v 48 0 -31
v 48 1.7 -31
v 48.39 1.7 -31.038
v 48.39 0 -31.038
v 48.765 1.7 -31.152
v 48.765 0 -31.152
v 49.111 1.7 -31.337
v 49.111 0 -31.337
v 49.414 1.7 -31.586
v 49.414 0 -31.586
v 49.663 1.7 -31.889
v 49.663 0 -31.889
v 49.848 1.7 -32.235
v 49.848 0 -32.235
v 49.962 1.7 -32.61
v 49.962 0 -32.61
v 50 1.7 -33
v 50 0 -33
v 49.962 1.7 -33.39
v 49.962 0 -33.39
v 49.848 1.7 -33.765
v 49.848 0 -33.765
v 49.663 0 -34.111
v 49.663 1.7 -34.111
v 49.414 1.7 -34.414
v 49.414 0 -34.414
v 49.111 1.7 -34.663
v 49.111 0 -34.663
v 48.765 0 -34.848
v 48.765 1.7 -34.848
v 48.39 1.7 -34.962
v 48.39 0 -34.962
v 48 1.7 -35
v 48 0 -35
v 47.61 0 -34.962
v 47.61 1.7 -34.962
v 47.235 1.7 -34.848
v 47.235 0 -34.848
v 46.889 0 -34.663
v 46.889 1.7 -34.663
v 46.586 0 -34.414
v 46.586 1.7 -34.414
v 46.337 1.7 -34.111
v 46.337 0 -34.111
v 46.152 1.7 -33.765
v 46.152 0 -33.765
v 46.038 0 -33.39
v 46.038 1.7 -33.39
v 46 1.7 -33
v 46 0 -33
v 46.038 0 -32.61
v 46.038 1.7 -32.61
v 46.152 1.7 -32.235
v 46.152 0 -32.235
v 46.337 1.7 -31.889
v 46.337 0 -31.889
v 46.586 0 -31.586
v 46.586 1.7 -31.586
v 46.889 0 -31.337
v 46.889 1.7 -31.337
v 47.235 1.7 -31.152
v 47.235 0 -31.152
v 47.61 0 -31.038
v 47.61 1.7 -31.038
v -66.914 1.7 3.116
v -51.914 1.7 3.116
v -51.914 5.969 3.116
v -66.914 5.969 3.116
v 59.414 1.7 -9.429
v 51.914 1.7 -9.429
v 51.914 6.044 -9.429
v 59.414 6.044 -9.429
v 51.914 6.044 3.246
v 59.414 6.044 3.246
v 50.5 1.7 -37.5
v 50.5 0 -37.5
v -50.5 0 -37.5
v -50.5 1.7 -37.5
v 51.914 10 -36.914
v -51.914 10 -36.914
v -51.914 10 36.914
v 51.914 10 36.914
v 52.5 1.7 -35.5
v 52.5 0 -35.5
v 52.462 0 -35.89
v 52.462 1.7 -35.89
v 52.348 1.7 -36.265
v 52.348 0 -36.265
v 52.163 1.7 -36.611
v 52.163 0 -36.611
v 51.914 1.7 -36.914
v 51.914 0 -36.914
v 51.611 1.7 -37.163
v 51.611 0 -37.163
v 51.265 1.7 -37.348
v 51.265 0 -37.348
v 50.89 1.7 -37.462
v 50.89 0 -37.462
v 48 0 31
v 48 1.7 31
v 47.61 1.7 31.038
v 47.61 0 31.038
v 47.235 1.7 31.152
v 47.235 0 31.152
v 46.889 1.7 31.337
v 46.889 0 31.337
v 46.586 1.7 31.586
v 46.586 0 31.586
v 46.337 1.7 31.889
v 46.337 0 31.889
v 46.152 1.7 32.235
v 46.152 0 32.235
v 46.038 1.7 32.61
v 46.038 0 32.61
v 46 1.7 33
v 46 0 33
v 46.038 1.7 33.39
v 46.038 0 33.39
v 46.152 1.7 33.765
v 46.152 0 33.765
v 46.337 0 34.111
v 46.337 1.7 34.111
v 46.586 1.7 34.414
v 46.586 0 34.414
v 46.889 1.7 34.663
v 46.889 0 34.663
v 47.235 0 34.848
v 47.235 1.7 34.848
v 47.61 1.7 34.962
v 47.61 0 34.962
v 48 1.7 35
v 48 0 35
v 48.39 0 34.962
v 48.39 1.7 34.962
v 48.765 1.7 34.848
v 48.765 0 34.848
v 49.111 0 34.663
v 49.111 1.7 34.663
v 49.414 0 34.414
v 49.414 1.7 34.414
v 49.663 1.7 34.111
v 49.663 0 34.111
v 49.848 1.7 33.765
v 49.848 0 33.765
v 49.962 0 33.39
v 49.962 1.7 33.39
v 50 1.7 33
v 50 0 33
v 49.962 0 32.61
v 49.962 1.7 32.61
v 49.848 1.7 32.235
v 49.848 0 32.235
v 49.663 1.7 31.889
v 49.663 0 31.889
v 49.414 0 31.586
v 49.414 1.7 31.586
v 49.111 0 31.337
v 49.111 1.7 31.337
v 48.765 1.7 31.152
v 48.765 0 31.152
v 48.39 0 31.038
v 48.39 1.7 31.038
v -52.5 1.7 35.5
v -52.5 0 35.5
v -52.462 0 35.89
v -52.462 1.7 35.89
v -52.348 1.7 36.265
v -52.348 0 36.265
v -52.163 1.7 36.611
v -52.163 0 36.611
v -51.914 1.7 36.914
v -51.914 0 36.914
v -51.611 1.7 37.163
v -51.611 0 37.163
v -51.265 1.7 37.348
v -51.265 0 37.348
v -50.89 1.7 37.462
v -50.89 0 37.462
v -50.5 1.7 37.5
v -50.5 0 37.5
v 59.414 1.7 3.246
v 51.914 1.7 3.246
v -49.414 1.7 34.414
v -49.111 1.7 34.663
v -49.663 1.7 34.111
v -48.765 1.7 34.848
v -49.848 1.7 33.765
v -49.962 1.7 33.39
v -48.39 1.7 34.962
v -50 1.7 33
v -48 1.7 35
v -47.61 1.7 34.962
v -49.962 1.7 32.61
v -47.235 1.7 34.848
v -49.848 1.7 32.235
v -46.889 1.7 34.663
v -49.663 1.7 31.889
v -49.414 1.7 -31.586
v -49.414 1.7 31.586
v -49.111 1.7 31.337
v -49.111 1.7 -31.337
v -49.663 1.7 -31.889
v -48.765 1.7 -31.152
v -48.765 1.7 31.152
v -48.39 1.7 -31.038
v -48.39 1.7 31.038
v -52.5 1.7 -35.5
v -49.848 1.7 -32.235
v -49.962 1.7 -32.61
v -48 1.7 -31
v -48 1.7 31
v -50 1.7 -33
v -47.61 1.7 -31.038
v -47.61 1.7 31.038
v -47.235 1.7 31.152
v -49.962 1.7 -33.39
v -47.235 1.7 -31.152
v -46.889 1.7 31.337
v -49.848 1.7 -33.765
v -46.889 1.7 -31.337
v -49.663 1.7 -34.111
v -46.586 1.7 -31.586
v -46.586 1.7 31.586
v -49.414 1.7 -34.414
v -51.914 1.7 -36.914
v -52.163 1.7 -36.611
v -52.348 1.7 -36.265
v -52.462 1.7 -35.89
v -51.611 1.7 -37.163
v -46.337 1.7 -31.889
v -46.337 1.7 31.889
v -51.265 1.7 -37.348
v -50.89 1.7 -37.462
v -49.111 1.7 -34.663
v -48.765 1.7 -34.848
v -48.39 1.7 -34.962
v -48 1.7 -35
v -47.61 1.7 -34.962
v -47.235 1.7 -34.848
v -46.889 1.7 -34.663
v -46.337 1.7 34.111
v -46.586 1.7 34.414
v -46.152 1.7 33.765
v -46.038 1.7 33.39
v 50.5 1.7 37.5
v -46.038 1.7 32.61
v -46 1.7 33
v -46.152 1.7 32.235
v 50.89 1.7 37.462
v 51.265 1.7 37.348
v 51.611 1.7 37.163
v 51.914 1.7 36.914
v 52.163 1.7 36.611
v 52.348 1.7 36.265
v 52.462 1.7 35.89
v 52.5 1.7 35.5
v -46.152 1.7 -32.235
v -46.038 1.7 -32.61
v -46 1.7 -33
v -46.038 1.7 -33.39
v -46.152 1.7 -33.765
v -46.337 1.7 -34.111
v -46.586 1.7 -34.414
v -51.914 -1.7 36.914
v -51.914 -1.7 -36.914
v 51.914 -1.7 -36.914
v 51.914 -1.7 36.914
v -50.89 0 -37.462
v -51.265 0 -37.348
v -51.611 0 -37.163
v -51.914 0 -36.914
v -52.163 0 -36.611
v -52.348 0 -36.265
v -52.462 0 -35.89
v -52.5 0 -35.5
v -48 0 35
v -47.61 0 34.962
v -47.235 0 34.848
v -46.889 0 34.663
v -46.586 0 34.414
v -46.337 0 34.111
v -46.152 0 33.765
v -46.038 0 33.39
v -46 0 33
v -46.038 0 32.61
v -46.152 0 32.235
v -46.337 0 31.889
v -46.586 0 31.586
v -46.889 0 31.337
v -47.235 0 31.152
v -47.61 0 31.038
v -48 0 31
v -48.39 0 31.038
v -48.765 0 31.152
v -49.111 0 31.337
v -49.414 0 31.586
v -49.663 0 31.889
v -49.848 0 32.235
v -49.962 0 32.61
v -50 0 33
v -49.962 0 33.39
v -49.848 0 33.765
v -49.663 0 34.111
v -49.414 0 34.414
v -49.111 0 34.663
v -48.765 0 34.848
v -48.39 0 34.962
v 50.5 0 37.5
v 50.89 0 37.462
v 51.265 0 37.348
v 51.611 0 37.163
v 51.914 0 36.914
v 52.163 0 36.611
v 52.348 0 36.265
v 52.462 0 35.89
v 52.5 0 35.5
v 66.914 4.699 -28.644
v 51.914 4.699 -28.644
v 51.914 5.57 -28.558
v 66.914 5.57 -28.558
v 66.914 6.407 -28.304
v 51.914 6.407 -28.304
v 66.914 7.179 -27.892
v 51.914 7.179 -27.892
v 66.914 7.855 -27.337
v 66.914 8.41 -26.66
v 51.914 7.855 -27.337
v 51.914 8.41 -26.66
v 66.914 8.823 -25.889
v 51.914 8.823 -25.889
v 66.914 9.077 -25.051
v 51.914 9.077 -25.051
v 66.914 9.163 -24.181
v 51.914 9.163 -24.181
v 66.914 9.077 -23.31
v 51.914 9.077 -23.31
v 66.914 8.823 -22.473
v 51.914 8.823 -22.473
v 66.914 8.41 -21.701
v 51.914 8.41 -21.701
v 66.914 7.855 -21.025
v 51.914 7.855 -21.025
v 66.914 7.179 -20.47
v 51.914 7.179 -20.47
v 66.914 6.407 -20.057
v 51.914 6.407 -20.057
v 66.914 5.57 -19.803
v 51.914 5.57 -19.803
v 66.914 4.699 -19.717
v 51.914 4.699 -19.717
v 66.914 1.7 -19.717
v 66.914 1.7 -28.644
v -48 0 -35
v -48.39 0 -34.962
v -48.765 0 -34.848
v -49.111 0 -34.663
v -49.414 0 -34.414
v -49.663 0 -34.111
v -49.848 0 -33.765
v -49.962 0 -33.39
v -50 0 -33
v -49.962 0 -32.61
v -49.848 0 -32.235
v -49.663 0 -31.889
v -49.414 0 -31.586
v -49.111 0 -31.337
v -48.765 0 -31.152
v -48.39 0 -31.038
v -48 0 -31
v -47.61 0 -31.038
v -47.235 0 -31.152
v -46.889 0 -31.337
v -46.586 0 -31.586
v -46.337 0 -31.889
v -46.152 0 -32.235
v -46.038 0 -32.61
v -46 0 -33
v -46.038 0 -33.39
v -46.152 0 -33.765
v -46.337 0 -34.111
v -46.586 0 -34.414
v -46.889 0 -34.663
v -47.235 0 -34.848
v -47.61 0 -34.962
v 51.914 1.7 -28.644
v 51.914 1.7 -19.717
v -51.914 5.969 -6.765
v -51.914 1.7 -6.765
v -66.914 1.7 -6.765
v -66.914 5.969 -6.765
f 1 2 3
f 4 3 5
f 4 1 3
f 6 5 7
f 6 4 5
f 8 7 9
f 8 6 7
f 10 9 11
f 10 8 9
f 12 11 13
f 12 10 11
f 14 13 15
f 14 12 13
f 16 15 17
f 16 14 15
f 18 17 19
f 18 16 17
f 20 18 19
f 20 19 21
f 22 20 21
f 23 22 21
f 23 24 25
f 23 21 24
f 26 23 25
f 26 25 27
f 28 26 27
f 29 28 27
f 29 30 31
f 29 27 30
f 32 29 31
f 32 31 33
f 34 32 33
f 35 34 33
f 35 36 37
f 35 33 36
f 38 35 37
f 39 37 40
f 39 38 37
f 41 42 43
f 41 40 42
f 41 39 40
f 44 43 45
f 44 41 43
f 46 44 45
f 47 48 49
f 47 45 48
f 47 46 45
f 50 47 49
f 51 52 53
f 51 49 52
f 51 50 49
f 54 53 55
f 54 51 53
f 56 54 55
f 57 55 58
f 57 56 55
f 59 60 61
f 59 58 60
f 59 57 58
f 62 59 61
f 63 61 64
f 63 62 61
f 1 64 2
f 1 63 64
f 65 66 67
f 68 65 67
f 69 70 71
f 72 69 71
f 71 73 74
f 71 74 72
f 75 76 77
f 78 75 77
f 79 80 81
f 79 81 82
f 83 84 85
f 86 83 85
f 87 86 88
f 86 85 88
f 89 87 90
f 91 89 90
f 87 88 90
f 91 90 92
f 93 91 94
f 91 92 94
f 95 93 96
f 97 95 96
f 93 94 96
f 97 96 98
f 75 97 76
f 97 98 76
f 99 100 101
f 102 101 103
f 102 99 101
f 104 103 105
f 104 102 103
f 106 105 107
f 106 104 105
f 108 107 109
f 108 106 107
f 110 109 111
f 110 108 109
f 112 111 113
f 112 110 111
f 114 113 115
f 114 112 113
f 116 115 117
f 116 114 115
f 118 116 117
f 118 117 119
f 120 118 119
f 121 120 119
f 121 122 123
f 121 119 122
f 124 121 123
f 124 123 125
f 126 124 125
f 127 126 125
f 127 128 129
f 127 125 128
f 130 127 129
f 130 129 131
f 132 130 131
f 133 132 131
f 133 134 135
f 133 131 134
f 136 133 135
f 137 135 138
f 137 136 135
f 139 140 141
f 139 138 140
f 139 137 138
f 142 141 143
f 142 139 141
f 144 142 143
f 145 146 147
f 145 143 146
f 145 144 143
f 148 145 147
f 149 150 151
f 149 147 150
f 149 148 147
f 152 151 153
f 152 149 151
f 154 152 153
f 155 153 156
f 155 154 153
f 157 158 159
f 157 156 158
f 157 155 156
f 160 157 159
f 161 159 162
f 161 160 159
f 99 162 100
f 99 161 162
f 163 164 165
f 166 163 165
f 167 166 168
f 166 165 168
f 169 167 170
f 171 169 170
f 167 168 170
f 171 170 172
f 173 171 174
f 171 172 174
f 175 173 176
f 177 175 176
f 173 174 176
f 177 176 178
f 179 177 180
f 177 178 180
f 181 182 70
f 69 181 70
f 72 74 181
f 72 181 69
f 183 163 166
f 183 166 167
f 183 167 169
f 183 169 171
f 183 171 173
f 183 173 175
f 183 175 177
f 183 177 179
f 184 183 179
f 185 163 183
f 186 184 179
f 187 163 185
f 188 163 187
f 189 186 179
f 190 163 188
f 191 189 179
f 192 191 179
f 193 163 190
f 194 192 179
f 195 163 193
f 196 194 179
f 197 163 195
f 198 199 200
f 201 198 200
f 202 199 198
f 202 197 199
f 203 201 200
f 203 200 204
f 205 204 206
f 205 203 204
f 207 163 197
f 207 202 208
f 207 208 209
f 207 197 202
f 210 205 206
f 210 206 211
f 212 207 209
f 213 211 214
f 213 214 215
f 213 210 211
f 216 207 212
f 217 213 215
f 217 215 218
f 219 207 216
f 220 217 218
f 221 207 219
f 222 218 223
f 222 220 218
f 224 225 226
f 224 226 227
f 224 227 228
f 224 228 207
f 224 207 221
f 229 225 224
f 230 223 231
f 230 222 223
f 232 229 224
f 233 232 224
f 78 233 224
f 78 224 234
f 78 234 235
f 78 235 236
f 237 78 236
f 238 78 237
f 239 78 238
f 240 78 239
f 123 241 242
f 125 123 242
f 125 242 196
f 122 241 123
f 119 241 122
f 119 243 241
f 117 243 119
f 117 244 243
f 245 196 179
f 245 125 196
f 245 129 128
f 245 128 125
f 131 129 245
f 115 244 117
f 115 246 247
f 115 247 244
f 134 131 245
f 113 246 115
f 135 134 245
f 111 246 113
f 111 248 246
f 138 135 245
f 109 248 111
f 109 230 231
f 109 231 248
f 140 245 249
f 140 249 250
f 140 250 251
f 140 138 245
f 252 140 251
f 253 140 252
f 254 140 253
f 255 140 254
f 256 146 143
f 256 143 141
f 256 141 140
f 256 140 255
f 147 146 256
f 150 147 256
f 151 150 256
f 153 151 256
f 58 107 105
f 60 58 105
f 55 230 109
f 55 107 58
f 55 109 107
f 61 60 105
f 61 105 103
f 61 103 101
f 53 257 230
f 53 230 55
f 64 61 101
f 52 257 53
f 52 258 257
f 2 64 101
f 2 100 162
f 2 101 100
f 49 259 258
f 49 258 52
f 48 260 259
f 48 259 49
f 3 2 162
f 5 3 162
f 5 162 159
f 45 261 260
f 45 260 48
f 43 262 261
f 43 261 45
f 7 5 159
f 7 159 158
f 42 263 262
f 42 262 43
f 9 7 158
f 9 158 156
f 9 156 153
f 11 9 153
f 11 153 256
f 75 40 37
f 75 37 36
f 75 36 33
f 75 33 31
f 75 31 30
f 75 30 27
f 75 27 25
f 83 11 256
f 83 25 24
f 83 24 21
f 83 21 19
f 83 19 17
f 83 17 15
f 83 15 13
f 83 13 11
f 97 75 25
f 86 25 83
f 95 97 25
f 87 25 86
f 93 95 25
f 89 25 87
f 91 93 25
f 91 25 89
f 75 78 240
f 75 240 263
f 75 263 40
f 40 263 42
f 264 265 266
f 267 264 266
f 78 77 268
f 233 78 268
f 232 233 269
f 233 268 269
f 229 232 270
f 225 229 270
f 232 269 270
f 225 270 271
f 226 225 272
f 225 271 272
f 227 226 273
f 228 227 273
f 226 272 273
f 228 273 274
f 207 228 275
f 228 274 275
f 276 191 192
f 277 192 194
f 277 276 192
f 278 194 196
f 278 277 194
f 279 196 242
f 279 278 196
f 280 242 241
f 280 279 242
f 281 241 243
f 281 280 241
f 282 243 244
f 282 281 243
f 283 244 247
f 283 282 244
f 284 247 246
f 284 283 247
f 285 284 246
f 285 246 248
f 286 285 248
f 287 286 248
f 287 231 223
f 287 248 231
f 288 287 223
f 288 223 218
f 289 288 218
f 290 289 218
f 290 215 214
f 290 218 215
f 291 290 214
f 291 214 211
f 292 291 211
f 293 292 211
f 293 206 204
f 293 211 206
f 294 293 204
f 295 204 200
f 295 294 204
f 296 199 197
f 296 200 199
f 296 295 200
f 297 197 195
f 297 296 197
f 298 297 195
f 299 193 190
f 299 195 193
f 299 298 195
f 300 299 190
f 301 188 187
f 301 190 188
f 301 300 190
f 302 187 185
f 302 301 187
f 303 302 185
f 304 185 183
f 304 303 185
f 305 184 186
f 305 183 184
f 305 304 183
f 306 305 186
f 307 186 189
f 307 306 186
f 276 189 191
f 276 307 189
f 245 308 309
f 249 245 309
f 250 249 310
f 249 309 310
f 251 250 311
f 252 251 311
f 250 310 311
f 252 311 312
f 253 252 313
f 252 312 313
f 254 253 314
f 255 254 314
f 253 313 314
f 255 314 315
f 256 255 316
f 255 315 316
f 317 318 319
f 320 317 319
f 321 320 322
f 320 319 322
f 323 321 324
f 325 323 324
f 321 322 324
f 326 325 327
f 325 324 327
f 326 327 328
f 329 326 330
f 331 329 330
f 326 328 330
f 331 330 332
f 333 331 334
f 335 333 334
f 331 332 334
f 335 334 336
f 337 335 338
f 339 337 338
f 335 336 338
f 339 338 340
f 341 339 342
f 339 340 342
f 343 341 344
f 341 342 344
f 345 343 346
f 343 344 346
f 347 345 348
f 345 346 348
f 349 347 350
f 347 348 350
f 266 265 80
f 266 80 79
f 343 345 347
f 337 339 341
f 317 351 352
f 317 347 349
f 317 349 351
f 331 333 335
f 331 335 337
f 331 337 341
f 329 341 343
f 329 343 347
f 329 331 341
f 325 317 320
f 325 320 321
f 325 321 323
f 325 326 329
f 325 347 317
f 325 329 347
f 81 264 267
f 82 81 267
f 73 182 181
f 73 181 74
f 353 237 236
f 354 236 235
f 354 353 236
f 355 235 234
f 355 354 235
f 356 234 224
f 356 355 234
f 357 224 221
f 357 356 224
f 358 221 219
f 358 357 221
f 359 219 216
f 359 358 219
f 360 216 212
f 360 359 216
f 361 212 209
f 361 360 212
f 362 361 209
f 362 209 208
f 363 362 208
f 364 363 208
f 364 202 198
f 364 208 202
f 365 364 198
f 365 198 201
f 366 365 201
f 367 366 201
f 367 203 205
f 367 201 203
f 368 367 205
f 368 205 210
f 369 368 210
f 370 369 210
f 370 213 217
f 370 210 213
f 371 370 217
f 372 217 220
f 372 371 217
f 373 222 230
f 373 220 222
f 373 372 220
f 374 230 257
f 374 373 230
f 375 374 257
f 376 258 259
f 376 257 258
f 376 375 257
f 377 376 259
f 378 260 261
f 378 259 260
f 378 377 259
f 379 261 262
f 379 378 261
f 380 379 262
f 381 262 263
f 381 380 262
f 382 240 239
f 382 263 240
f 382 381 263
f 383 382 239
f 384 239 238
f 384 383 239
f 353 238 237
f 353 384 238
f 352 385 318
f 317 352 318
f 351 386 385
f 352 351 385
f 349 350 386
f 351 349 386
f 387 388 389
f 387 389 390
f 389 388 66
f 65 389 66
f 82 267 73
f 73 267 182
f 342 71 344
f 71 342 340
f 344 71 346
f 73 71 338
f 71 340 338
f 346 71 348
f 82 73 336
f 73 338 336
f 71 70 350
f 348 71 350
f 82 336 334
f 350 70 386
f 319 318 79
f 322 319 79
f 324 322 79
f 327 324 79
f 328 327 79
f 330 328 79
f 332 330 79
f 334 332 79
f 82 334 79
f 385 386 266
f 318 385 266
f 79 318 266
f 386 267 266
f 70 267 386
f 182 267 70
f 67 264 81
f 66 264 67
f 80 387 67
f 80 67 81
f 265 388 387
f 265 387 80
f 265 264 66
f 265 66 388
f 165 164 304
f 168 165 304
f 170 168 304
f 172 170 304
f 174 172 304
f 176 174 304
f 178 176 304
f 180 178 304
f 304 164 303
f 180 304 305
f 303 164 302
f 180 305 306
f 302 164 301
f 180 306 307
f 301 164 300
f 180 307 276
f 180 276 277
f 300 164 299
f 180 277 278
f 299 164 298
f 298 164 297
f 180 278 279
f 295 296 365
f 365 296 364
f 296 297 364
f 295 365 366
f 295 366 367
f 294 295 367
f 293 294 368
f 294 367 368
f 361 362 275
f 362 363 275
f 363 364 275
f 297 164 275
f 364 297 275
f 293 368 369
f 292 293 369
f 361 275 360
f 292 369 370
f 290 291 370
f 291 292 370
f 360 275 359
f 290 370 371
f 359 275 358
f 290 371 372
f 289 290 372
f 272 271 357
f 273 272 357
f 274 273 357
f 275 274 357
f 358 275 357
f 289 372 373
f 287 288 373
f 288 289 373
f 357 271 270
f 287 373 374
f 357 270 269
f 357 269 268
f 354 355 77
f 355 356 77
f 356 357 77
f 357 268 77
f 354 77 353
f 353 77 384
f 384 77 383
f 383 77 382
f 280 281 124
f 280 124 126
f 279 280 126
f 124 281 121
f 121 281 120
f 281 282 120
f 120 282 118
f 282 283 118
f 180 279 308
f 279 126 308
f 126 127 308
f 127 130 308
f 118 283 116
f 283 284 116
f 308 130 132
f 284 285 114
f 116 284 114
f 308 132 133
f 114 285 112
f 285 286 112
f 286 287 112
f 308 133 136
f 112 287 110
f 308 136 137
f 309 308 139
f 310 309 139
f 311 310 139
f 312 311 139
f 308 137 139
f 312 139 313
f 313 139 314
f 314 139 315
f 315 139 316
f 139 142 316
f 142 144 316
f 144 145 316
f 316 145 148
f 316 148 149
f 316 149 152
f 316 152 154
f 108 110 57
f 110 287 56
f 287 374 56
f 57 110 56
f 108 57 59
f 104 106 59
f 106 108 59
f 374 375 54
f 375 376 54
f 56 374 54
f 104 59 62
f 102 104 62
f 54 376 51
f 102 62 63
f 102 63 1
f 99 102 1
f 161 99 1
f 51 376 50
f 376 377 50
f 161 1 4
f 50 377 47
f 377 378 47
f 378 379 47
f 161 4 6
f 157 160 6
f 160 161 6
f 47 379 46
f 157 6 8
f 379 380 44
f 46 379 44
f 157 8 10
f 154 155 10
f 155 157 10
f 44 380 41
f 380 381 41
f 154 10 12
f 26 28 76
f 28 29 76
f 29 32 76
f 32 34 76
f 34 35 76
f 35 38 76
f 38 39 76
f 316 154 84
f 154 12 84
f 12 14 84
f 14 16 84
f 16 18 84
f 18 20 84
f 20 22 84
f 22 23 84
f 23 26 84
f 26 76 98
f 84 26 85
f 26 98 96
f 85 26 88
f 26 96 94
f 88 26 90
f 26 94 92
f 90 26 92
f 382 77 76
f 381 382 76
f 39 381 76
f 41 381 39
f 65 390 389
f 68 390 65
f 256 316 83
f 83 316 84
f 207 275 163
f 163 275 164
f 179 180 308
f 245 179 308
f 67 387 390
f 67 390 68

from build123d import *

# Parameters (mm, degrees)
FORMEPCB_DEPTH              = 1.7
ESQUISSE3_R                 = 2
PATERNTROUPCB_DEPTH         = 65.539832662
ESPACECOMPOSANTE_DEPTH      = 10
ESPACECOMPOSANTE_DEPTH_BACK = 1.7
ESQUISSE4_W                 = 103.828427124
ESQUISSE4_H                 = 73.828427124
ESQUISSE5_W                 = 12.674409656
ESQUISSE5_H                 = 4.344058099
ESPACESWITCH_DEPTH          = 7.5
ESPACEPOWER_DEPTH           = 15
ESQUISSE7_W                 = 9.880922925
ESQUISSE7_H                 = 4.269023058
ESPACEUSB_DEPTH             = 15


with BuildPart() as part:
    # Esquisse1 → FormePCB (new body)
    with BuildSketch(Plane(origin=(0, 0, 0), x_dir=(1, 0, 0), z_dir=(0, 1, 0))):
        with BuildLine():
            Line((-50.5, -37.5), (50.5, -37.5))
            ThreePointArc((50.5, -37.5), (51.914213562, -36.914213562), (52.5, -35.5))
            Line((52.5, -35.5), (52.5, 35.5))
            ThreePointArc((52.5, 35.5), (51.914213562, 36.914213562), (50.5, 37.5))
            Line((50.5, 37.5), (-50.5, 37.5))
            ThreePointArc((-50.5, 37.5), (-51.914213562, 36.914213562), (-52.5, 35.5))
            Line((-52.5, 35.5), (-52.5, -35.5))
            ThreePointArc((-52.5, -35.5), (-51.914213562, -36.914213562), (-50.5, -37.5))
        make_face()
    extrude(amount=FORMEPCB_DEPTH)

    # Esquisse3 → PaternTrouPCB (cut, through all)
    with BuildSketch(Plane(origin=(0, 0, 0), x_dir=(1, 0, 0), z_dir=(0, 1, 0))):
        with Locations(Location((48, 33, 0), (0, 0, 270))):
            Circle(ESQUISSE3_R)
        with Locations(Location((48, -33, 0), (0, 0, 90))):
            Circle(ESQUISSE3_R)
        with Locations(Location((-48, 33, 0), (0, 0, 90))):
            Circle(ESQUISSE3_R)
        with Locations(Location((-48, -33, 0), (0, 0, 270))):
            Circle(ESQUISSE3_R)
    extrude(amount=PATERNTROUPCB_DEPTH, mode=Mode.SUBTRACT)


with BuildPart() as body_2:
    # Esquisse4 → EspaceComposante (new, two sides: drawn at the far end of the back side and taken through both)
    with BuildSketch(Plane(origin=(0, 0, 0), x_dir=(1, 0, 0), z_dir=(0, 1, 0)).offset(-ESPACECOMPOSANTE_DEPTH_BACK)):
        Rectangle(ESQUISSE4_W, ESQUISSE4_H)
    extrude(amount=ESPACECOMPOSANTE_DEPTH + ESPACECOMPOSANTE_DEPTH_BACK)

    # Esquisse5 → EspaceSwitch (add)
    with BuildSketch(Plane(origin=(51.914213562, 0, 0), x_dir=(0, 0, -1), z_dir=(1, 0, 0))):
        with Locations((3.091310104, 3.87202905)):
            Rectangle(ESQUISSE5_W, ESQUISSE5_H)
    extrude(amount=ESPACESWITCH_DEPTH)

    # Esquisse6 → EspacePower (add)
    with BuildSketch(Plane(origin=(51.914213562, 0, 0), x_dir=(0, 0, -1), z_dir=(1, 0, 0))):
        with BuildLine():
            Line((19.71741504, 1.7), (28.643749067, 1.7))
            Line((28.643749067, 1.7), (28.643749067, 4.699337824))
            ThreePointArc((28.643749067, 4.699337824), (24.180582053, 9.162504837), (19.71741504, 4.699337824))
            Line((19.71741504, 4.699337824), (19.71741504, 1.7))
        make_face()
    extrude(amount=ESPACEPOWER_DEPTH)

    # Esquisse7 → EspaceUSB (add)
    with BuildSketch(Plane.ZY.offset(51.914213562)):
        with Locations((-1.824754593, 3.834511529)):
            Rectangle(ESQUISSE7_W, ESQUISSE7_H)
    extrude(amount=ESPACEUSB_DEPTH)


solid = Compound([part.part, body_2.part])
